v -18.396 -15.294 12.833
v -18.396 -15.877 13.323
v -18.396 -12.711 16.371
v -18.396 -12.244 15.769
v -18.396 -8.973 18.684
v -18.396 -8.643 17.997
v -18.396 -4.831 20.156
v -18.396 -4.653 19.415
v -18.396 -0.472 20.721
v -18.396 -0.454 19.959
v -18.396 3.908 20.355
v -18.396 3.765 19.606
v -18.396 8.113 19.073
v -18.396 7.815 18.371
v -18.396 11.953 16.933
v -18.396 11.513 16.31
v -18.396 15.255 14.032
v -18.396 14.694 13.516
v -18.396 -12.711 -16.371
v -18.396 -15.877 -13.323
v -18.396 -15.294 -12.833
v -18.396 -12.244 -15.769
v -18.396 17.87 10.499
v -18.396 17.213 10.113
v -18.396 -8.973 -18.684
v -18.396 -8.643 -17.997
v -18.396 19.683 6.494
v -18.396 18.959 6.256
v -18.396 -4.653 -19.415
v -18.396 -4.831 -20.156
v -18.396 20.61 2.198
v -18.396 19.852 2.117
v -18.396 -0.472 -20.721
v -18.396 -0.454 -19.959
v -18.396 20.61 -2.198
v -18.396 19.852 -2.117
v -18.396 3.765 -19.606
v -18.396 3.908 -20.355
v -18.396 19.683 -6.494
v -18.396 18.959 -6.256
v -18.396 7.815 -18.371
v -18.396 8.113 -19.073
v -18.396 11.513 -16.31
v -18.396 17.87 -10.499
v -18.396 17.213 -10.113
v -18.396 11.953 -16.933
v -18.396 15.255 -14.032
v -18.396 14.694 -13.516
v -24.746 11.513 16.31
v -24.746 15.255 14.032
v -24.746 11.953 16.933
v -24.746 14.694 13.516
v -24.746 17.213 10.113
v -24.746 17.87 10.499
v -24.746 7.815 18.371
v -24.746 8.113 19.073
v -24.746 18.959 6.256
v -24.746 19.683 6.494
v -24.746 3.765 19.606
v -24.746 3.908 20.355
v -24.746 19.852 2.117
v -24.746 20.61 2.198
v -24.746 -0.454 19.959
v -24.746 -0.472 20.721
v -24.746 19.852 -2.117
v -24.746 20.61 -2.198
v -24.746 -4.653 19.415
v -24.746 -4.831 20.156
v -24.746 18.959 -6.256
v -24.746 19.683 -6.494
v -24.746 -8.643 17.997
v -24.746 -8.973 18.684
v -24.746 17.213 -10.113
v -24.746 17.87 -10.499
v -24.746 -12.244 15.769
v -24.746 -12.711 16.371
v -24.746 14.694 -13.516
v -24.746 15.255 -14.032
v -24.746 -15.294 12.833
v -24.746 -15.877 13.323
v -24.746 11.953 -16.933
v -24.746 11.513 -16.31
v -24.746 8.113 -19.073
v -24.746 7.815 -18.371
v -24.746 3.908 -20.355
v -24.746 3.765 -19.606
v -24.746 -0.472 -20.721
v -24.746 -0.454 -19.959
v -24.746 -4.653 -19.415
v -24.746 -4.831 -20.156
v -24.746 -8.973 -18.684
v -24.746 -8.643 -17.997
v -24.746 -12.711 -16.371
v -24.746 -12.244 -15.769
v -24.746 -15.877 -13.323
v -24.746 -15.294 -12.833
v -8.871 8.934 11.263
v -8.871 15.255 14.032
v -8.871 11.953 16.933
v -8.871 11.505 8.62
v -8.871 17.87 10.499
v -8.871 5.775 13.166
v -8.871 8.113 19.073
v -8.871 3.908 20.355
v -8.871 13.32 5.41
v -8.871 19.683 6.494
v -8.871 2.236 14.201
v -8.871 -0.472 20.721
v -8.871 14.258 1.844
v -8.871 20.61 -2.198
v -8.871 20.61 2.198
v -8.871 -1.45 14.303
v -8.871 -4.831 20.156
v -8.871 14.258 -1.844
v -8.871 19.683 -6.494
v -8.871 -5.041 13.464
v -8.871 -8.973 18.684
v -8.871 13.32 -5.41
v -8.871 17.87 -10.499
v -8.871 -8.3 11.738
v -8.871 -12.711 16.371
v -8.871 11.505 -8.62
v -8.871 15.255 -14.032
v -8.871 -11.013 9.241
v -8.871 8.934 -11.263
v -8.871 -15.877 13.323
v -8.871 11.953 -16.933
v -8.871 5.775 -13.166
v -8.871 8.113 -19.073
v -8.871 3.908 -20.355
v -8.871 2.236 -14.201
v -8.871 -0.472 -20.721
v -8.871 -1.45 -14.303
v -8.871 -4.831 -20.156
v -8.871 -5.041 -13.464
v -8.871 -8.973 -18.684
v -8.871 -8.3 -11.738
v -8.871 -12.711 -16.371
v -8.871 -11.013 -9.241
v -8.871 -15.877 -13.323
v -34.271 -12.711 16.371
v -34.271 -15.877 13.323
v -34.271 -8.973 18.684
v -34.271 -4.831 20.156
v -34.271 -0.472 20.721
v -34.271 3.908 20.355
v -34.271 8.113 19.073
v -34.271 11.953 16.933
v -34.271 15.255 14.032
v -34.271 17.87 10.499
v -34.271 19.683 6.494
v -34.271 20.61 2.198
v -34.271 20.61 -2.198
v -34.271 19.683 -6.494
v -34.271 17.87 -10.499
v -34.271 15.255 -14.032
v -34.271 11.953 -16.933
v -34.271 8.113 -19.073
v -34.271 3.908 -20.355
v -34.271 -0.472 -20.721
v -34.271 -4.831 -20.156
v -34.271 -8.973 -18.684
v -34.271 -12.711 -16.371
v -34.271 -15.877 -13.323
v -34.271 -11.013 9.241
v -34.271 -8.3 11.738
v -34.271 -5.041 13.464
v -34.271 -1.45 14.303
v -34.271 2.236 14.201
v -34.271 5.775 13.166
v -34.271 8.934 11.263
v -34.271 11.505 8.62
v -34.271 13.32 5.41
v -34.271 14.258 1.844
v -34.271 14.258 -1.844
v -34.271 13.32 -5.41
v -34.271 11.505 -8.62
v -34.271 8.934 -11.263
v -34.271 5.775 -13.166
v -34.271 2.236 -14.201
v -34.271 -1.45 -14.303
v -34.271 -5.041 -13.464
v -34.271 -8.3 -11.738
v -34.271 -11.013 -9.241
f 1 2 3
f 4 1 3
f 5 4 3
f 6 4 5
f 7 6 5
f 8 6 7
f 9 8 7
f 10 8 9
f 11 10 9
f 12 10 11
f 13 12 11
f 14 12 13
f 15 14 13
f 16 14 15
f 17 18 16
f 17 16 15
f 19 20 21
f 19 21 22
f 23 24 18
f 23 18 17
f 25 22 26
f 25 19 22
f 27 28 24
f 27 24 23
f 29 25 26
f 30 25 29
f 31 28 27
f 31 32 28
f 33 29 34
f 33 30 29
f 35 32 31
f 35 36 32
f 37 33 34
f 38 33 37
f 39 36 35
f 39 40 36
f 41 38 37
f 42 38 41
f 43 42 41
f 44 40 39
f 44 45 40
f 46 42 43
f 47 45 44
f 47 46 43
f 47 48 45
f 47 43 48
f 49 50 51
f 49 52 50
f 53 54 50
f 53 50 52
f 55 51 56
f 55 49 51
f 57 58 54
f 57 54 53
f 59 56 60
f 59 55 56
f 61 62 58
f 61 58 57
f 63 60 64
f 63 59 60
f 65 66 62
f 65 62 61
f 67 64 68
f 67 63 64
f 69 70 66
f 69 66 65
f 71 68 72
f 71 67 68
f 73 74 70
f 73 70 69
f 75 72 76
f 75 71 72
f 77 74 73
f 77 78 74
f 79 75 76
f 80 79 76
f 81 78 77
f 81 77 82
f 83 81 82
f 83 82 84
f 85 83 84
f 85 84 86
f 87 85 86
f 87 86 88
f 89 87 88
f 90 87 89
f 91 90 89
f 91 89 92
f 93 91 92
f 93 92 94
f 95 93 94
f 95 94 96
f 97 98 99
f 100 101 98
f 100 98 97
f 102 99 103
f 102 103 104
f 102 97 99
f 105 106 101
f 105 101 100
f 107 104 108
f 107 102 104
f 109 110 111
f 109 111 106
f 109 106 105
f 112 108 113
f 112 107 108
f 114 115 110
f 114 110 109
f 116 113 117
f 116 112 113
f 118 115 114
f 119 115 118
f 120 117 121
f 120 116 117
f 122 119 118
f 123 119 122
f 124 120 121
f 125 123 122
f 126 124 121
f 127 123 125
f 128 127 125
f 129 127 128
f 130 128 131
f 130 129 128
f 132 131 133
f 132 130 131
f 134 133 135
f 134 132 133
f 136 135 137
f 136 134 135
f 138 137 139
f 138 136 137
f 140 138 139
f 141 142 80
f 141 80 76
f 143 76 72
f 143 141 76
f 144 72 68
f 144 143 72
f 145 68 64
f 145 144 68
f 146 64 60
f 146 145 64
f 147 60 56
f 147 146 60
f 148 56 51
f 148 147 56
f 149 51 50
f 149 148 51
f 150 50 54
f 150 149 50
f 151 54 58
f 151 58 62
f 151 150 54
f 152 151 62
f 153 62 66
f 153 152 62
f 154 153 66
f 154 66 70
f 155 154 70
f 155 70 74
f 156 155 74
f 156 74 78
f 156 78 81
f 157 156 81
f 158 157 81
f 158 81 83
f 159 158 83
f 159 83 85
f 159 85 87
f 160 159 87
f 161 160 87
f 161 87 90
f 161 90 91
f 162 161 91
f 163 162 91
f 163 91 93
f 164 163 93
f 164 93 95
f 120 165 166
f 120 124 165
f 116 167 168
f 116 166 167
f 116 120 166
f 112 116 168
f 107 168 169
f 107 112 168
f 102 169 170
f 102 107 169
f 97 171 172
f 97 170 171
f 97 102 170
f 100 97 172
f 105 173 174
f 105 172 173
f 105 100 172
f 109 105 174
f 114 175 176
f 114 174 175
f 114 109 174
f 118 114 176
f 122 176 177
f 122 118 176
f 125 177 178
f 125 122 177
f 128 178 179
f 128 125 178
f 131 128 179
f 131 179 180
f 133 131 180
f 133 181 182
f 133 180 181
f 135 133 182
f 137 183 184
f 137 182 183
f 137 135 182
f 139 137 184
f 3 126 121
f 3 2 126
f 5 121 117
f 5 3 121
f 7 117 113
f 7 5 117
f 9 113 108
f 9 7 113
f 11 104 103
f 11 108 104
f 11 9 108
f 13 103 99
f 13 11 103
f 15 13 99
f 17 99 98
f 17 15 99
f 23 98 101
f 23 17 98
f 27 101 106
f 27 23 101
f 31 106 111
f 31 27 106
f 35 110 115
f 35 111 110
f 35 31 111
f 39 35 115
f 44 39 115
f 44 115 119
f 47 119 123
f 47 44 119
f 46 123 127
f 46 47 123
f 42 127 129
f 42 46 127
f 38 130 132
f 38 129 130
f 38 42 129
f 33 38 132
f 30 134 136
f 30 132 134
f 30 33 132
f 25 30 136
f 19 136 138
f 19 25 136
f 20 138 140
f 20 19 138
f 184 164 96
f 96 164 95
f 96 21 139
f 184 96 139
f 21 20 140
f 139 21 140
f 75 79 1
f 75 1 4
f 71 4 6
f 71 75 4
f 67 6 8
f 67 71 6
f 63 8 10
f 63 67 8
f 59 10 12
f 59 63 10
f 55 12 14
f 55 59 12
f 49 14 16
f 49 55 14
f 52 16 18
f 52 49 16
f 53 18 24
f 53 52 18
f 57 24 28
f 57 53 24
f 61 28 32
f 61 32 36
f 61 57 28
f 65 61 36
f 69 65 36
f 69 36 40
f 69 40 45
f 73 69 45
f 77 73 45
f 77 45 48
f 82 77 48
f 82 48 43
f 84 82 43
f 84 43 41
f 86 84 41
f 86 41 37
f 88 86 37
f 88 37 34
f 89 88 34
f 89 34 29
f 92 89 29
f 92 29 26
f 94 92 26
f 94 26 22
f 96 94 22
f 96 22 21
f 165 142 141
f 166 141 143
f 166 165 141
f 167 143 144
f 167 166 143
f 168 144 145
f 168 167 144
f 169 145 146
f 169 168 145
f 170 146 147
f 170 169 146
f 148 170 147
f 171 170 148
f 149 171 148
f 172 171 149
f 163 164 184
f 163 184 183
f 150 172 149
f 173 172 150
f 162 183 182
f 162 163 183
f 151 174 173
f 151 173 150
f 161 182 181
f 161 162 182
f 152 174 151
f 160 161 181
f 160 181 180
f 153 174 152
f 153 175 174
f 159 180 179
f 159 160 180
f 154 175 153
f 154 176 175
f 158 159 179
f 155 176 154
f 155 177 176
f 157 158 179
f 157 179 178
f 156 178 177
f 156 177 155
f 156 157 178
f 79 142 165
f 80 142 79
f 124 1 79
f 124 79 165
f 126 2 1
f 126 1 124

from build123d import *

# Parameters (mm, degrees)
F1_ANGLE = 280


with BuildPart() as f1:
    # F0 (on Top) → F1 (revolve, symmetric)
    with BuildSketch(Plane.XY) as f1_sk:
        Polygon((-24.746018, 20.7264), (-34.271018, 20.7264), (-34.271018, 14.3764), (-8.871018, 14.3764), (-8.871018, 20.7264), (-18.396018, 20.7264), (-18.396018, 19.9644), (-24.746018, 19.9644), align=None)
    revolve(axis=Axis((-0.871302, 0, 0), (1, 0, 0)), revolution_arc=F1_ANGLE / 2)
    revolve(f1_sk.sketch, axis=Axis((-0.871302, 0, 0), (-1, 0, 0)), revolution_arc=F1_ANGLE / 2)


solid = f1.part
